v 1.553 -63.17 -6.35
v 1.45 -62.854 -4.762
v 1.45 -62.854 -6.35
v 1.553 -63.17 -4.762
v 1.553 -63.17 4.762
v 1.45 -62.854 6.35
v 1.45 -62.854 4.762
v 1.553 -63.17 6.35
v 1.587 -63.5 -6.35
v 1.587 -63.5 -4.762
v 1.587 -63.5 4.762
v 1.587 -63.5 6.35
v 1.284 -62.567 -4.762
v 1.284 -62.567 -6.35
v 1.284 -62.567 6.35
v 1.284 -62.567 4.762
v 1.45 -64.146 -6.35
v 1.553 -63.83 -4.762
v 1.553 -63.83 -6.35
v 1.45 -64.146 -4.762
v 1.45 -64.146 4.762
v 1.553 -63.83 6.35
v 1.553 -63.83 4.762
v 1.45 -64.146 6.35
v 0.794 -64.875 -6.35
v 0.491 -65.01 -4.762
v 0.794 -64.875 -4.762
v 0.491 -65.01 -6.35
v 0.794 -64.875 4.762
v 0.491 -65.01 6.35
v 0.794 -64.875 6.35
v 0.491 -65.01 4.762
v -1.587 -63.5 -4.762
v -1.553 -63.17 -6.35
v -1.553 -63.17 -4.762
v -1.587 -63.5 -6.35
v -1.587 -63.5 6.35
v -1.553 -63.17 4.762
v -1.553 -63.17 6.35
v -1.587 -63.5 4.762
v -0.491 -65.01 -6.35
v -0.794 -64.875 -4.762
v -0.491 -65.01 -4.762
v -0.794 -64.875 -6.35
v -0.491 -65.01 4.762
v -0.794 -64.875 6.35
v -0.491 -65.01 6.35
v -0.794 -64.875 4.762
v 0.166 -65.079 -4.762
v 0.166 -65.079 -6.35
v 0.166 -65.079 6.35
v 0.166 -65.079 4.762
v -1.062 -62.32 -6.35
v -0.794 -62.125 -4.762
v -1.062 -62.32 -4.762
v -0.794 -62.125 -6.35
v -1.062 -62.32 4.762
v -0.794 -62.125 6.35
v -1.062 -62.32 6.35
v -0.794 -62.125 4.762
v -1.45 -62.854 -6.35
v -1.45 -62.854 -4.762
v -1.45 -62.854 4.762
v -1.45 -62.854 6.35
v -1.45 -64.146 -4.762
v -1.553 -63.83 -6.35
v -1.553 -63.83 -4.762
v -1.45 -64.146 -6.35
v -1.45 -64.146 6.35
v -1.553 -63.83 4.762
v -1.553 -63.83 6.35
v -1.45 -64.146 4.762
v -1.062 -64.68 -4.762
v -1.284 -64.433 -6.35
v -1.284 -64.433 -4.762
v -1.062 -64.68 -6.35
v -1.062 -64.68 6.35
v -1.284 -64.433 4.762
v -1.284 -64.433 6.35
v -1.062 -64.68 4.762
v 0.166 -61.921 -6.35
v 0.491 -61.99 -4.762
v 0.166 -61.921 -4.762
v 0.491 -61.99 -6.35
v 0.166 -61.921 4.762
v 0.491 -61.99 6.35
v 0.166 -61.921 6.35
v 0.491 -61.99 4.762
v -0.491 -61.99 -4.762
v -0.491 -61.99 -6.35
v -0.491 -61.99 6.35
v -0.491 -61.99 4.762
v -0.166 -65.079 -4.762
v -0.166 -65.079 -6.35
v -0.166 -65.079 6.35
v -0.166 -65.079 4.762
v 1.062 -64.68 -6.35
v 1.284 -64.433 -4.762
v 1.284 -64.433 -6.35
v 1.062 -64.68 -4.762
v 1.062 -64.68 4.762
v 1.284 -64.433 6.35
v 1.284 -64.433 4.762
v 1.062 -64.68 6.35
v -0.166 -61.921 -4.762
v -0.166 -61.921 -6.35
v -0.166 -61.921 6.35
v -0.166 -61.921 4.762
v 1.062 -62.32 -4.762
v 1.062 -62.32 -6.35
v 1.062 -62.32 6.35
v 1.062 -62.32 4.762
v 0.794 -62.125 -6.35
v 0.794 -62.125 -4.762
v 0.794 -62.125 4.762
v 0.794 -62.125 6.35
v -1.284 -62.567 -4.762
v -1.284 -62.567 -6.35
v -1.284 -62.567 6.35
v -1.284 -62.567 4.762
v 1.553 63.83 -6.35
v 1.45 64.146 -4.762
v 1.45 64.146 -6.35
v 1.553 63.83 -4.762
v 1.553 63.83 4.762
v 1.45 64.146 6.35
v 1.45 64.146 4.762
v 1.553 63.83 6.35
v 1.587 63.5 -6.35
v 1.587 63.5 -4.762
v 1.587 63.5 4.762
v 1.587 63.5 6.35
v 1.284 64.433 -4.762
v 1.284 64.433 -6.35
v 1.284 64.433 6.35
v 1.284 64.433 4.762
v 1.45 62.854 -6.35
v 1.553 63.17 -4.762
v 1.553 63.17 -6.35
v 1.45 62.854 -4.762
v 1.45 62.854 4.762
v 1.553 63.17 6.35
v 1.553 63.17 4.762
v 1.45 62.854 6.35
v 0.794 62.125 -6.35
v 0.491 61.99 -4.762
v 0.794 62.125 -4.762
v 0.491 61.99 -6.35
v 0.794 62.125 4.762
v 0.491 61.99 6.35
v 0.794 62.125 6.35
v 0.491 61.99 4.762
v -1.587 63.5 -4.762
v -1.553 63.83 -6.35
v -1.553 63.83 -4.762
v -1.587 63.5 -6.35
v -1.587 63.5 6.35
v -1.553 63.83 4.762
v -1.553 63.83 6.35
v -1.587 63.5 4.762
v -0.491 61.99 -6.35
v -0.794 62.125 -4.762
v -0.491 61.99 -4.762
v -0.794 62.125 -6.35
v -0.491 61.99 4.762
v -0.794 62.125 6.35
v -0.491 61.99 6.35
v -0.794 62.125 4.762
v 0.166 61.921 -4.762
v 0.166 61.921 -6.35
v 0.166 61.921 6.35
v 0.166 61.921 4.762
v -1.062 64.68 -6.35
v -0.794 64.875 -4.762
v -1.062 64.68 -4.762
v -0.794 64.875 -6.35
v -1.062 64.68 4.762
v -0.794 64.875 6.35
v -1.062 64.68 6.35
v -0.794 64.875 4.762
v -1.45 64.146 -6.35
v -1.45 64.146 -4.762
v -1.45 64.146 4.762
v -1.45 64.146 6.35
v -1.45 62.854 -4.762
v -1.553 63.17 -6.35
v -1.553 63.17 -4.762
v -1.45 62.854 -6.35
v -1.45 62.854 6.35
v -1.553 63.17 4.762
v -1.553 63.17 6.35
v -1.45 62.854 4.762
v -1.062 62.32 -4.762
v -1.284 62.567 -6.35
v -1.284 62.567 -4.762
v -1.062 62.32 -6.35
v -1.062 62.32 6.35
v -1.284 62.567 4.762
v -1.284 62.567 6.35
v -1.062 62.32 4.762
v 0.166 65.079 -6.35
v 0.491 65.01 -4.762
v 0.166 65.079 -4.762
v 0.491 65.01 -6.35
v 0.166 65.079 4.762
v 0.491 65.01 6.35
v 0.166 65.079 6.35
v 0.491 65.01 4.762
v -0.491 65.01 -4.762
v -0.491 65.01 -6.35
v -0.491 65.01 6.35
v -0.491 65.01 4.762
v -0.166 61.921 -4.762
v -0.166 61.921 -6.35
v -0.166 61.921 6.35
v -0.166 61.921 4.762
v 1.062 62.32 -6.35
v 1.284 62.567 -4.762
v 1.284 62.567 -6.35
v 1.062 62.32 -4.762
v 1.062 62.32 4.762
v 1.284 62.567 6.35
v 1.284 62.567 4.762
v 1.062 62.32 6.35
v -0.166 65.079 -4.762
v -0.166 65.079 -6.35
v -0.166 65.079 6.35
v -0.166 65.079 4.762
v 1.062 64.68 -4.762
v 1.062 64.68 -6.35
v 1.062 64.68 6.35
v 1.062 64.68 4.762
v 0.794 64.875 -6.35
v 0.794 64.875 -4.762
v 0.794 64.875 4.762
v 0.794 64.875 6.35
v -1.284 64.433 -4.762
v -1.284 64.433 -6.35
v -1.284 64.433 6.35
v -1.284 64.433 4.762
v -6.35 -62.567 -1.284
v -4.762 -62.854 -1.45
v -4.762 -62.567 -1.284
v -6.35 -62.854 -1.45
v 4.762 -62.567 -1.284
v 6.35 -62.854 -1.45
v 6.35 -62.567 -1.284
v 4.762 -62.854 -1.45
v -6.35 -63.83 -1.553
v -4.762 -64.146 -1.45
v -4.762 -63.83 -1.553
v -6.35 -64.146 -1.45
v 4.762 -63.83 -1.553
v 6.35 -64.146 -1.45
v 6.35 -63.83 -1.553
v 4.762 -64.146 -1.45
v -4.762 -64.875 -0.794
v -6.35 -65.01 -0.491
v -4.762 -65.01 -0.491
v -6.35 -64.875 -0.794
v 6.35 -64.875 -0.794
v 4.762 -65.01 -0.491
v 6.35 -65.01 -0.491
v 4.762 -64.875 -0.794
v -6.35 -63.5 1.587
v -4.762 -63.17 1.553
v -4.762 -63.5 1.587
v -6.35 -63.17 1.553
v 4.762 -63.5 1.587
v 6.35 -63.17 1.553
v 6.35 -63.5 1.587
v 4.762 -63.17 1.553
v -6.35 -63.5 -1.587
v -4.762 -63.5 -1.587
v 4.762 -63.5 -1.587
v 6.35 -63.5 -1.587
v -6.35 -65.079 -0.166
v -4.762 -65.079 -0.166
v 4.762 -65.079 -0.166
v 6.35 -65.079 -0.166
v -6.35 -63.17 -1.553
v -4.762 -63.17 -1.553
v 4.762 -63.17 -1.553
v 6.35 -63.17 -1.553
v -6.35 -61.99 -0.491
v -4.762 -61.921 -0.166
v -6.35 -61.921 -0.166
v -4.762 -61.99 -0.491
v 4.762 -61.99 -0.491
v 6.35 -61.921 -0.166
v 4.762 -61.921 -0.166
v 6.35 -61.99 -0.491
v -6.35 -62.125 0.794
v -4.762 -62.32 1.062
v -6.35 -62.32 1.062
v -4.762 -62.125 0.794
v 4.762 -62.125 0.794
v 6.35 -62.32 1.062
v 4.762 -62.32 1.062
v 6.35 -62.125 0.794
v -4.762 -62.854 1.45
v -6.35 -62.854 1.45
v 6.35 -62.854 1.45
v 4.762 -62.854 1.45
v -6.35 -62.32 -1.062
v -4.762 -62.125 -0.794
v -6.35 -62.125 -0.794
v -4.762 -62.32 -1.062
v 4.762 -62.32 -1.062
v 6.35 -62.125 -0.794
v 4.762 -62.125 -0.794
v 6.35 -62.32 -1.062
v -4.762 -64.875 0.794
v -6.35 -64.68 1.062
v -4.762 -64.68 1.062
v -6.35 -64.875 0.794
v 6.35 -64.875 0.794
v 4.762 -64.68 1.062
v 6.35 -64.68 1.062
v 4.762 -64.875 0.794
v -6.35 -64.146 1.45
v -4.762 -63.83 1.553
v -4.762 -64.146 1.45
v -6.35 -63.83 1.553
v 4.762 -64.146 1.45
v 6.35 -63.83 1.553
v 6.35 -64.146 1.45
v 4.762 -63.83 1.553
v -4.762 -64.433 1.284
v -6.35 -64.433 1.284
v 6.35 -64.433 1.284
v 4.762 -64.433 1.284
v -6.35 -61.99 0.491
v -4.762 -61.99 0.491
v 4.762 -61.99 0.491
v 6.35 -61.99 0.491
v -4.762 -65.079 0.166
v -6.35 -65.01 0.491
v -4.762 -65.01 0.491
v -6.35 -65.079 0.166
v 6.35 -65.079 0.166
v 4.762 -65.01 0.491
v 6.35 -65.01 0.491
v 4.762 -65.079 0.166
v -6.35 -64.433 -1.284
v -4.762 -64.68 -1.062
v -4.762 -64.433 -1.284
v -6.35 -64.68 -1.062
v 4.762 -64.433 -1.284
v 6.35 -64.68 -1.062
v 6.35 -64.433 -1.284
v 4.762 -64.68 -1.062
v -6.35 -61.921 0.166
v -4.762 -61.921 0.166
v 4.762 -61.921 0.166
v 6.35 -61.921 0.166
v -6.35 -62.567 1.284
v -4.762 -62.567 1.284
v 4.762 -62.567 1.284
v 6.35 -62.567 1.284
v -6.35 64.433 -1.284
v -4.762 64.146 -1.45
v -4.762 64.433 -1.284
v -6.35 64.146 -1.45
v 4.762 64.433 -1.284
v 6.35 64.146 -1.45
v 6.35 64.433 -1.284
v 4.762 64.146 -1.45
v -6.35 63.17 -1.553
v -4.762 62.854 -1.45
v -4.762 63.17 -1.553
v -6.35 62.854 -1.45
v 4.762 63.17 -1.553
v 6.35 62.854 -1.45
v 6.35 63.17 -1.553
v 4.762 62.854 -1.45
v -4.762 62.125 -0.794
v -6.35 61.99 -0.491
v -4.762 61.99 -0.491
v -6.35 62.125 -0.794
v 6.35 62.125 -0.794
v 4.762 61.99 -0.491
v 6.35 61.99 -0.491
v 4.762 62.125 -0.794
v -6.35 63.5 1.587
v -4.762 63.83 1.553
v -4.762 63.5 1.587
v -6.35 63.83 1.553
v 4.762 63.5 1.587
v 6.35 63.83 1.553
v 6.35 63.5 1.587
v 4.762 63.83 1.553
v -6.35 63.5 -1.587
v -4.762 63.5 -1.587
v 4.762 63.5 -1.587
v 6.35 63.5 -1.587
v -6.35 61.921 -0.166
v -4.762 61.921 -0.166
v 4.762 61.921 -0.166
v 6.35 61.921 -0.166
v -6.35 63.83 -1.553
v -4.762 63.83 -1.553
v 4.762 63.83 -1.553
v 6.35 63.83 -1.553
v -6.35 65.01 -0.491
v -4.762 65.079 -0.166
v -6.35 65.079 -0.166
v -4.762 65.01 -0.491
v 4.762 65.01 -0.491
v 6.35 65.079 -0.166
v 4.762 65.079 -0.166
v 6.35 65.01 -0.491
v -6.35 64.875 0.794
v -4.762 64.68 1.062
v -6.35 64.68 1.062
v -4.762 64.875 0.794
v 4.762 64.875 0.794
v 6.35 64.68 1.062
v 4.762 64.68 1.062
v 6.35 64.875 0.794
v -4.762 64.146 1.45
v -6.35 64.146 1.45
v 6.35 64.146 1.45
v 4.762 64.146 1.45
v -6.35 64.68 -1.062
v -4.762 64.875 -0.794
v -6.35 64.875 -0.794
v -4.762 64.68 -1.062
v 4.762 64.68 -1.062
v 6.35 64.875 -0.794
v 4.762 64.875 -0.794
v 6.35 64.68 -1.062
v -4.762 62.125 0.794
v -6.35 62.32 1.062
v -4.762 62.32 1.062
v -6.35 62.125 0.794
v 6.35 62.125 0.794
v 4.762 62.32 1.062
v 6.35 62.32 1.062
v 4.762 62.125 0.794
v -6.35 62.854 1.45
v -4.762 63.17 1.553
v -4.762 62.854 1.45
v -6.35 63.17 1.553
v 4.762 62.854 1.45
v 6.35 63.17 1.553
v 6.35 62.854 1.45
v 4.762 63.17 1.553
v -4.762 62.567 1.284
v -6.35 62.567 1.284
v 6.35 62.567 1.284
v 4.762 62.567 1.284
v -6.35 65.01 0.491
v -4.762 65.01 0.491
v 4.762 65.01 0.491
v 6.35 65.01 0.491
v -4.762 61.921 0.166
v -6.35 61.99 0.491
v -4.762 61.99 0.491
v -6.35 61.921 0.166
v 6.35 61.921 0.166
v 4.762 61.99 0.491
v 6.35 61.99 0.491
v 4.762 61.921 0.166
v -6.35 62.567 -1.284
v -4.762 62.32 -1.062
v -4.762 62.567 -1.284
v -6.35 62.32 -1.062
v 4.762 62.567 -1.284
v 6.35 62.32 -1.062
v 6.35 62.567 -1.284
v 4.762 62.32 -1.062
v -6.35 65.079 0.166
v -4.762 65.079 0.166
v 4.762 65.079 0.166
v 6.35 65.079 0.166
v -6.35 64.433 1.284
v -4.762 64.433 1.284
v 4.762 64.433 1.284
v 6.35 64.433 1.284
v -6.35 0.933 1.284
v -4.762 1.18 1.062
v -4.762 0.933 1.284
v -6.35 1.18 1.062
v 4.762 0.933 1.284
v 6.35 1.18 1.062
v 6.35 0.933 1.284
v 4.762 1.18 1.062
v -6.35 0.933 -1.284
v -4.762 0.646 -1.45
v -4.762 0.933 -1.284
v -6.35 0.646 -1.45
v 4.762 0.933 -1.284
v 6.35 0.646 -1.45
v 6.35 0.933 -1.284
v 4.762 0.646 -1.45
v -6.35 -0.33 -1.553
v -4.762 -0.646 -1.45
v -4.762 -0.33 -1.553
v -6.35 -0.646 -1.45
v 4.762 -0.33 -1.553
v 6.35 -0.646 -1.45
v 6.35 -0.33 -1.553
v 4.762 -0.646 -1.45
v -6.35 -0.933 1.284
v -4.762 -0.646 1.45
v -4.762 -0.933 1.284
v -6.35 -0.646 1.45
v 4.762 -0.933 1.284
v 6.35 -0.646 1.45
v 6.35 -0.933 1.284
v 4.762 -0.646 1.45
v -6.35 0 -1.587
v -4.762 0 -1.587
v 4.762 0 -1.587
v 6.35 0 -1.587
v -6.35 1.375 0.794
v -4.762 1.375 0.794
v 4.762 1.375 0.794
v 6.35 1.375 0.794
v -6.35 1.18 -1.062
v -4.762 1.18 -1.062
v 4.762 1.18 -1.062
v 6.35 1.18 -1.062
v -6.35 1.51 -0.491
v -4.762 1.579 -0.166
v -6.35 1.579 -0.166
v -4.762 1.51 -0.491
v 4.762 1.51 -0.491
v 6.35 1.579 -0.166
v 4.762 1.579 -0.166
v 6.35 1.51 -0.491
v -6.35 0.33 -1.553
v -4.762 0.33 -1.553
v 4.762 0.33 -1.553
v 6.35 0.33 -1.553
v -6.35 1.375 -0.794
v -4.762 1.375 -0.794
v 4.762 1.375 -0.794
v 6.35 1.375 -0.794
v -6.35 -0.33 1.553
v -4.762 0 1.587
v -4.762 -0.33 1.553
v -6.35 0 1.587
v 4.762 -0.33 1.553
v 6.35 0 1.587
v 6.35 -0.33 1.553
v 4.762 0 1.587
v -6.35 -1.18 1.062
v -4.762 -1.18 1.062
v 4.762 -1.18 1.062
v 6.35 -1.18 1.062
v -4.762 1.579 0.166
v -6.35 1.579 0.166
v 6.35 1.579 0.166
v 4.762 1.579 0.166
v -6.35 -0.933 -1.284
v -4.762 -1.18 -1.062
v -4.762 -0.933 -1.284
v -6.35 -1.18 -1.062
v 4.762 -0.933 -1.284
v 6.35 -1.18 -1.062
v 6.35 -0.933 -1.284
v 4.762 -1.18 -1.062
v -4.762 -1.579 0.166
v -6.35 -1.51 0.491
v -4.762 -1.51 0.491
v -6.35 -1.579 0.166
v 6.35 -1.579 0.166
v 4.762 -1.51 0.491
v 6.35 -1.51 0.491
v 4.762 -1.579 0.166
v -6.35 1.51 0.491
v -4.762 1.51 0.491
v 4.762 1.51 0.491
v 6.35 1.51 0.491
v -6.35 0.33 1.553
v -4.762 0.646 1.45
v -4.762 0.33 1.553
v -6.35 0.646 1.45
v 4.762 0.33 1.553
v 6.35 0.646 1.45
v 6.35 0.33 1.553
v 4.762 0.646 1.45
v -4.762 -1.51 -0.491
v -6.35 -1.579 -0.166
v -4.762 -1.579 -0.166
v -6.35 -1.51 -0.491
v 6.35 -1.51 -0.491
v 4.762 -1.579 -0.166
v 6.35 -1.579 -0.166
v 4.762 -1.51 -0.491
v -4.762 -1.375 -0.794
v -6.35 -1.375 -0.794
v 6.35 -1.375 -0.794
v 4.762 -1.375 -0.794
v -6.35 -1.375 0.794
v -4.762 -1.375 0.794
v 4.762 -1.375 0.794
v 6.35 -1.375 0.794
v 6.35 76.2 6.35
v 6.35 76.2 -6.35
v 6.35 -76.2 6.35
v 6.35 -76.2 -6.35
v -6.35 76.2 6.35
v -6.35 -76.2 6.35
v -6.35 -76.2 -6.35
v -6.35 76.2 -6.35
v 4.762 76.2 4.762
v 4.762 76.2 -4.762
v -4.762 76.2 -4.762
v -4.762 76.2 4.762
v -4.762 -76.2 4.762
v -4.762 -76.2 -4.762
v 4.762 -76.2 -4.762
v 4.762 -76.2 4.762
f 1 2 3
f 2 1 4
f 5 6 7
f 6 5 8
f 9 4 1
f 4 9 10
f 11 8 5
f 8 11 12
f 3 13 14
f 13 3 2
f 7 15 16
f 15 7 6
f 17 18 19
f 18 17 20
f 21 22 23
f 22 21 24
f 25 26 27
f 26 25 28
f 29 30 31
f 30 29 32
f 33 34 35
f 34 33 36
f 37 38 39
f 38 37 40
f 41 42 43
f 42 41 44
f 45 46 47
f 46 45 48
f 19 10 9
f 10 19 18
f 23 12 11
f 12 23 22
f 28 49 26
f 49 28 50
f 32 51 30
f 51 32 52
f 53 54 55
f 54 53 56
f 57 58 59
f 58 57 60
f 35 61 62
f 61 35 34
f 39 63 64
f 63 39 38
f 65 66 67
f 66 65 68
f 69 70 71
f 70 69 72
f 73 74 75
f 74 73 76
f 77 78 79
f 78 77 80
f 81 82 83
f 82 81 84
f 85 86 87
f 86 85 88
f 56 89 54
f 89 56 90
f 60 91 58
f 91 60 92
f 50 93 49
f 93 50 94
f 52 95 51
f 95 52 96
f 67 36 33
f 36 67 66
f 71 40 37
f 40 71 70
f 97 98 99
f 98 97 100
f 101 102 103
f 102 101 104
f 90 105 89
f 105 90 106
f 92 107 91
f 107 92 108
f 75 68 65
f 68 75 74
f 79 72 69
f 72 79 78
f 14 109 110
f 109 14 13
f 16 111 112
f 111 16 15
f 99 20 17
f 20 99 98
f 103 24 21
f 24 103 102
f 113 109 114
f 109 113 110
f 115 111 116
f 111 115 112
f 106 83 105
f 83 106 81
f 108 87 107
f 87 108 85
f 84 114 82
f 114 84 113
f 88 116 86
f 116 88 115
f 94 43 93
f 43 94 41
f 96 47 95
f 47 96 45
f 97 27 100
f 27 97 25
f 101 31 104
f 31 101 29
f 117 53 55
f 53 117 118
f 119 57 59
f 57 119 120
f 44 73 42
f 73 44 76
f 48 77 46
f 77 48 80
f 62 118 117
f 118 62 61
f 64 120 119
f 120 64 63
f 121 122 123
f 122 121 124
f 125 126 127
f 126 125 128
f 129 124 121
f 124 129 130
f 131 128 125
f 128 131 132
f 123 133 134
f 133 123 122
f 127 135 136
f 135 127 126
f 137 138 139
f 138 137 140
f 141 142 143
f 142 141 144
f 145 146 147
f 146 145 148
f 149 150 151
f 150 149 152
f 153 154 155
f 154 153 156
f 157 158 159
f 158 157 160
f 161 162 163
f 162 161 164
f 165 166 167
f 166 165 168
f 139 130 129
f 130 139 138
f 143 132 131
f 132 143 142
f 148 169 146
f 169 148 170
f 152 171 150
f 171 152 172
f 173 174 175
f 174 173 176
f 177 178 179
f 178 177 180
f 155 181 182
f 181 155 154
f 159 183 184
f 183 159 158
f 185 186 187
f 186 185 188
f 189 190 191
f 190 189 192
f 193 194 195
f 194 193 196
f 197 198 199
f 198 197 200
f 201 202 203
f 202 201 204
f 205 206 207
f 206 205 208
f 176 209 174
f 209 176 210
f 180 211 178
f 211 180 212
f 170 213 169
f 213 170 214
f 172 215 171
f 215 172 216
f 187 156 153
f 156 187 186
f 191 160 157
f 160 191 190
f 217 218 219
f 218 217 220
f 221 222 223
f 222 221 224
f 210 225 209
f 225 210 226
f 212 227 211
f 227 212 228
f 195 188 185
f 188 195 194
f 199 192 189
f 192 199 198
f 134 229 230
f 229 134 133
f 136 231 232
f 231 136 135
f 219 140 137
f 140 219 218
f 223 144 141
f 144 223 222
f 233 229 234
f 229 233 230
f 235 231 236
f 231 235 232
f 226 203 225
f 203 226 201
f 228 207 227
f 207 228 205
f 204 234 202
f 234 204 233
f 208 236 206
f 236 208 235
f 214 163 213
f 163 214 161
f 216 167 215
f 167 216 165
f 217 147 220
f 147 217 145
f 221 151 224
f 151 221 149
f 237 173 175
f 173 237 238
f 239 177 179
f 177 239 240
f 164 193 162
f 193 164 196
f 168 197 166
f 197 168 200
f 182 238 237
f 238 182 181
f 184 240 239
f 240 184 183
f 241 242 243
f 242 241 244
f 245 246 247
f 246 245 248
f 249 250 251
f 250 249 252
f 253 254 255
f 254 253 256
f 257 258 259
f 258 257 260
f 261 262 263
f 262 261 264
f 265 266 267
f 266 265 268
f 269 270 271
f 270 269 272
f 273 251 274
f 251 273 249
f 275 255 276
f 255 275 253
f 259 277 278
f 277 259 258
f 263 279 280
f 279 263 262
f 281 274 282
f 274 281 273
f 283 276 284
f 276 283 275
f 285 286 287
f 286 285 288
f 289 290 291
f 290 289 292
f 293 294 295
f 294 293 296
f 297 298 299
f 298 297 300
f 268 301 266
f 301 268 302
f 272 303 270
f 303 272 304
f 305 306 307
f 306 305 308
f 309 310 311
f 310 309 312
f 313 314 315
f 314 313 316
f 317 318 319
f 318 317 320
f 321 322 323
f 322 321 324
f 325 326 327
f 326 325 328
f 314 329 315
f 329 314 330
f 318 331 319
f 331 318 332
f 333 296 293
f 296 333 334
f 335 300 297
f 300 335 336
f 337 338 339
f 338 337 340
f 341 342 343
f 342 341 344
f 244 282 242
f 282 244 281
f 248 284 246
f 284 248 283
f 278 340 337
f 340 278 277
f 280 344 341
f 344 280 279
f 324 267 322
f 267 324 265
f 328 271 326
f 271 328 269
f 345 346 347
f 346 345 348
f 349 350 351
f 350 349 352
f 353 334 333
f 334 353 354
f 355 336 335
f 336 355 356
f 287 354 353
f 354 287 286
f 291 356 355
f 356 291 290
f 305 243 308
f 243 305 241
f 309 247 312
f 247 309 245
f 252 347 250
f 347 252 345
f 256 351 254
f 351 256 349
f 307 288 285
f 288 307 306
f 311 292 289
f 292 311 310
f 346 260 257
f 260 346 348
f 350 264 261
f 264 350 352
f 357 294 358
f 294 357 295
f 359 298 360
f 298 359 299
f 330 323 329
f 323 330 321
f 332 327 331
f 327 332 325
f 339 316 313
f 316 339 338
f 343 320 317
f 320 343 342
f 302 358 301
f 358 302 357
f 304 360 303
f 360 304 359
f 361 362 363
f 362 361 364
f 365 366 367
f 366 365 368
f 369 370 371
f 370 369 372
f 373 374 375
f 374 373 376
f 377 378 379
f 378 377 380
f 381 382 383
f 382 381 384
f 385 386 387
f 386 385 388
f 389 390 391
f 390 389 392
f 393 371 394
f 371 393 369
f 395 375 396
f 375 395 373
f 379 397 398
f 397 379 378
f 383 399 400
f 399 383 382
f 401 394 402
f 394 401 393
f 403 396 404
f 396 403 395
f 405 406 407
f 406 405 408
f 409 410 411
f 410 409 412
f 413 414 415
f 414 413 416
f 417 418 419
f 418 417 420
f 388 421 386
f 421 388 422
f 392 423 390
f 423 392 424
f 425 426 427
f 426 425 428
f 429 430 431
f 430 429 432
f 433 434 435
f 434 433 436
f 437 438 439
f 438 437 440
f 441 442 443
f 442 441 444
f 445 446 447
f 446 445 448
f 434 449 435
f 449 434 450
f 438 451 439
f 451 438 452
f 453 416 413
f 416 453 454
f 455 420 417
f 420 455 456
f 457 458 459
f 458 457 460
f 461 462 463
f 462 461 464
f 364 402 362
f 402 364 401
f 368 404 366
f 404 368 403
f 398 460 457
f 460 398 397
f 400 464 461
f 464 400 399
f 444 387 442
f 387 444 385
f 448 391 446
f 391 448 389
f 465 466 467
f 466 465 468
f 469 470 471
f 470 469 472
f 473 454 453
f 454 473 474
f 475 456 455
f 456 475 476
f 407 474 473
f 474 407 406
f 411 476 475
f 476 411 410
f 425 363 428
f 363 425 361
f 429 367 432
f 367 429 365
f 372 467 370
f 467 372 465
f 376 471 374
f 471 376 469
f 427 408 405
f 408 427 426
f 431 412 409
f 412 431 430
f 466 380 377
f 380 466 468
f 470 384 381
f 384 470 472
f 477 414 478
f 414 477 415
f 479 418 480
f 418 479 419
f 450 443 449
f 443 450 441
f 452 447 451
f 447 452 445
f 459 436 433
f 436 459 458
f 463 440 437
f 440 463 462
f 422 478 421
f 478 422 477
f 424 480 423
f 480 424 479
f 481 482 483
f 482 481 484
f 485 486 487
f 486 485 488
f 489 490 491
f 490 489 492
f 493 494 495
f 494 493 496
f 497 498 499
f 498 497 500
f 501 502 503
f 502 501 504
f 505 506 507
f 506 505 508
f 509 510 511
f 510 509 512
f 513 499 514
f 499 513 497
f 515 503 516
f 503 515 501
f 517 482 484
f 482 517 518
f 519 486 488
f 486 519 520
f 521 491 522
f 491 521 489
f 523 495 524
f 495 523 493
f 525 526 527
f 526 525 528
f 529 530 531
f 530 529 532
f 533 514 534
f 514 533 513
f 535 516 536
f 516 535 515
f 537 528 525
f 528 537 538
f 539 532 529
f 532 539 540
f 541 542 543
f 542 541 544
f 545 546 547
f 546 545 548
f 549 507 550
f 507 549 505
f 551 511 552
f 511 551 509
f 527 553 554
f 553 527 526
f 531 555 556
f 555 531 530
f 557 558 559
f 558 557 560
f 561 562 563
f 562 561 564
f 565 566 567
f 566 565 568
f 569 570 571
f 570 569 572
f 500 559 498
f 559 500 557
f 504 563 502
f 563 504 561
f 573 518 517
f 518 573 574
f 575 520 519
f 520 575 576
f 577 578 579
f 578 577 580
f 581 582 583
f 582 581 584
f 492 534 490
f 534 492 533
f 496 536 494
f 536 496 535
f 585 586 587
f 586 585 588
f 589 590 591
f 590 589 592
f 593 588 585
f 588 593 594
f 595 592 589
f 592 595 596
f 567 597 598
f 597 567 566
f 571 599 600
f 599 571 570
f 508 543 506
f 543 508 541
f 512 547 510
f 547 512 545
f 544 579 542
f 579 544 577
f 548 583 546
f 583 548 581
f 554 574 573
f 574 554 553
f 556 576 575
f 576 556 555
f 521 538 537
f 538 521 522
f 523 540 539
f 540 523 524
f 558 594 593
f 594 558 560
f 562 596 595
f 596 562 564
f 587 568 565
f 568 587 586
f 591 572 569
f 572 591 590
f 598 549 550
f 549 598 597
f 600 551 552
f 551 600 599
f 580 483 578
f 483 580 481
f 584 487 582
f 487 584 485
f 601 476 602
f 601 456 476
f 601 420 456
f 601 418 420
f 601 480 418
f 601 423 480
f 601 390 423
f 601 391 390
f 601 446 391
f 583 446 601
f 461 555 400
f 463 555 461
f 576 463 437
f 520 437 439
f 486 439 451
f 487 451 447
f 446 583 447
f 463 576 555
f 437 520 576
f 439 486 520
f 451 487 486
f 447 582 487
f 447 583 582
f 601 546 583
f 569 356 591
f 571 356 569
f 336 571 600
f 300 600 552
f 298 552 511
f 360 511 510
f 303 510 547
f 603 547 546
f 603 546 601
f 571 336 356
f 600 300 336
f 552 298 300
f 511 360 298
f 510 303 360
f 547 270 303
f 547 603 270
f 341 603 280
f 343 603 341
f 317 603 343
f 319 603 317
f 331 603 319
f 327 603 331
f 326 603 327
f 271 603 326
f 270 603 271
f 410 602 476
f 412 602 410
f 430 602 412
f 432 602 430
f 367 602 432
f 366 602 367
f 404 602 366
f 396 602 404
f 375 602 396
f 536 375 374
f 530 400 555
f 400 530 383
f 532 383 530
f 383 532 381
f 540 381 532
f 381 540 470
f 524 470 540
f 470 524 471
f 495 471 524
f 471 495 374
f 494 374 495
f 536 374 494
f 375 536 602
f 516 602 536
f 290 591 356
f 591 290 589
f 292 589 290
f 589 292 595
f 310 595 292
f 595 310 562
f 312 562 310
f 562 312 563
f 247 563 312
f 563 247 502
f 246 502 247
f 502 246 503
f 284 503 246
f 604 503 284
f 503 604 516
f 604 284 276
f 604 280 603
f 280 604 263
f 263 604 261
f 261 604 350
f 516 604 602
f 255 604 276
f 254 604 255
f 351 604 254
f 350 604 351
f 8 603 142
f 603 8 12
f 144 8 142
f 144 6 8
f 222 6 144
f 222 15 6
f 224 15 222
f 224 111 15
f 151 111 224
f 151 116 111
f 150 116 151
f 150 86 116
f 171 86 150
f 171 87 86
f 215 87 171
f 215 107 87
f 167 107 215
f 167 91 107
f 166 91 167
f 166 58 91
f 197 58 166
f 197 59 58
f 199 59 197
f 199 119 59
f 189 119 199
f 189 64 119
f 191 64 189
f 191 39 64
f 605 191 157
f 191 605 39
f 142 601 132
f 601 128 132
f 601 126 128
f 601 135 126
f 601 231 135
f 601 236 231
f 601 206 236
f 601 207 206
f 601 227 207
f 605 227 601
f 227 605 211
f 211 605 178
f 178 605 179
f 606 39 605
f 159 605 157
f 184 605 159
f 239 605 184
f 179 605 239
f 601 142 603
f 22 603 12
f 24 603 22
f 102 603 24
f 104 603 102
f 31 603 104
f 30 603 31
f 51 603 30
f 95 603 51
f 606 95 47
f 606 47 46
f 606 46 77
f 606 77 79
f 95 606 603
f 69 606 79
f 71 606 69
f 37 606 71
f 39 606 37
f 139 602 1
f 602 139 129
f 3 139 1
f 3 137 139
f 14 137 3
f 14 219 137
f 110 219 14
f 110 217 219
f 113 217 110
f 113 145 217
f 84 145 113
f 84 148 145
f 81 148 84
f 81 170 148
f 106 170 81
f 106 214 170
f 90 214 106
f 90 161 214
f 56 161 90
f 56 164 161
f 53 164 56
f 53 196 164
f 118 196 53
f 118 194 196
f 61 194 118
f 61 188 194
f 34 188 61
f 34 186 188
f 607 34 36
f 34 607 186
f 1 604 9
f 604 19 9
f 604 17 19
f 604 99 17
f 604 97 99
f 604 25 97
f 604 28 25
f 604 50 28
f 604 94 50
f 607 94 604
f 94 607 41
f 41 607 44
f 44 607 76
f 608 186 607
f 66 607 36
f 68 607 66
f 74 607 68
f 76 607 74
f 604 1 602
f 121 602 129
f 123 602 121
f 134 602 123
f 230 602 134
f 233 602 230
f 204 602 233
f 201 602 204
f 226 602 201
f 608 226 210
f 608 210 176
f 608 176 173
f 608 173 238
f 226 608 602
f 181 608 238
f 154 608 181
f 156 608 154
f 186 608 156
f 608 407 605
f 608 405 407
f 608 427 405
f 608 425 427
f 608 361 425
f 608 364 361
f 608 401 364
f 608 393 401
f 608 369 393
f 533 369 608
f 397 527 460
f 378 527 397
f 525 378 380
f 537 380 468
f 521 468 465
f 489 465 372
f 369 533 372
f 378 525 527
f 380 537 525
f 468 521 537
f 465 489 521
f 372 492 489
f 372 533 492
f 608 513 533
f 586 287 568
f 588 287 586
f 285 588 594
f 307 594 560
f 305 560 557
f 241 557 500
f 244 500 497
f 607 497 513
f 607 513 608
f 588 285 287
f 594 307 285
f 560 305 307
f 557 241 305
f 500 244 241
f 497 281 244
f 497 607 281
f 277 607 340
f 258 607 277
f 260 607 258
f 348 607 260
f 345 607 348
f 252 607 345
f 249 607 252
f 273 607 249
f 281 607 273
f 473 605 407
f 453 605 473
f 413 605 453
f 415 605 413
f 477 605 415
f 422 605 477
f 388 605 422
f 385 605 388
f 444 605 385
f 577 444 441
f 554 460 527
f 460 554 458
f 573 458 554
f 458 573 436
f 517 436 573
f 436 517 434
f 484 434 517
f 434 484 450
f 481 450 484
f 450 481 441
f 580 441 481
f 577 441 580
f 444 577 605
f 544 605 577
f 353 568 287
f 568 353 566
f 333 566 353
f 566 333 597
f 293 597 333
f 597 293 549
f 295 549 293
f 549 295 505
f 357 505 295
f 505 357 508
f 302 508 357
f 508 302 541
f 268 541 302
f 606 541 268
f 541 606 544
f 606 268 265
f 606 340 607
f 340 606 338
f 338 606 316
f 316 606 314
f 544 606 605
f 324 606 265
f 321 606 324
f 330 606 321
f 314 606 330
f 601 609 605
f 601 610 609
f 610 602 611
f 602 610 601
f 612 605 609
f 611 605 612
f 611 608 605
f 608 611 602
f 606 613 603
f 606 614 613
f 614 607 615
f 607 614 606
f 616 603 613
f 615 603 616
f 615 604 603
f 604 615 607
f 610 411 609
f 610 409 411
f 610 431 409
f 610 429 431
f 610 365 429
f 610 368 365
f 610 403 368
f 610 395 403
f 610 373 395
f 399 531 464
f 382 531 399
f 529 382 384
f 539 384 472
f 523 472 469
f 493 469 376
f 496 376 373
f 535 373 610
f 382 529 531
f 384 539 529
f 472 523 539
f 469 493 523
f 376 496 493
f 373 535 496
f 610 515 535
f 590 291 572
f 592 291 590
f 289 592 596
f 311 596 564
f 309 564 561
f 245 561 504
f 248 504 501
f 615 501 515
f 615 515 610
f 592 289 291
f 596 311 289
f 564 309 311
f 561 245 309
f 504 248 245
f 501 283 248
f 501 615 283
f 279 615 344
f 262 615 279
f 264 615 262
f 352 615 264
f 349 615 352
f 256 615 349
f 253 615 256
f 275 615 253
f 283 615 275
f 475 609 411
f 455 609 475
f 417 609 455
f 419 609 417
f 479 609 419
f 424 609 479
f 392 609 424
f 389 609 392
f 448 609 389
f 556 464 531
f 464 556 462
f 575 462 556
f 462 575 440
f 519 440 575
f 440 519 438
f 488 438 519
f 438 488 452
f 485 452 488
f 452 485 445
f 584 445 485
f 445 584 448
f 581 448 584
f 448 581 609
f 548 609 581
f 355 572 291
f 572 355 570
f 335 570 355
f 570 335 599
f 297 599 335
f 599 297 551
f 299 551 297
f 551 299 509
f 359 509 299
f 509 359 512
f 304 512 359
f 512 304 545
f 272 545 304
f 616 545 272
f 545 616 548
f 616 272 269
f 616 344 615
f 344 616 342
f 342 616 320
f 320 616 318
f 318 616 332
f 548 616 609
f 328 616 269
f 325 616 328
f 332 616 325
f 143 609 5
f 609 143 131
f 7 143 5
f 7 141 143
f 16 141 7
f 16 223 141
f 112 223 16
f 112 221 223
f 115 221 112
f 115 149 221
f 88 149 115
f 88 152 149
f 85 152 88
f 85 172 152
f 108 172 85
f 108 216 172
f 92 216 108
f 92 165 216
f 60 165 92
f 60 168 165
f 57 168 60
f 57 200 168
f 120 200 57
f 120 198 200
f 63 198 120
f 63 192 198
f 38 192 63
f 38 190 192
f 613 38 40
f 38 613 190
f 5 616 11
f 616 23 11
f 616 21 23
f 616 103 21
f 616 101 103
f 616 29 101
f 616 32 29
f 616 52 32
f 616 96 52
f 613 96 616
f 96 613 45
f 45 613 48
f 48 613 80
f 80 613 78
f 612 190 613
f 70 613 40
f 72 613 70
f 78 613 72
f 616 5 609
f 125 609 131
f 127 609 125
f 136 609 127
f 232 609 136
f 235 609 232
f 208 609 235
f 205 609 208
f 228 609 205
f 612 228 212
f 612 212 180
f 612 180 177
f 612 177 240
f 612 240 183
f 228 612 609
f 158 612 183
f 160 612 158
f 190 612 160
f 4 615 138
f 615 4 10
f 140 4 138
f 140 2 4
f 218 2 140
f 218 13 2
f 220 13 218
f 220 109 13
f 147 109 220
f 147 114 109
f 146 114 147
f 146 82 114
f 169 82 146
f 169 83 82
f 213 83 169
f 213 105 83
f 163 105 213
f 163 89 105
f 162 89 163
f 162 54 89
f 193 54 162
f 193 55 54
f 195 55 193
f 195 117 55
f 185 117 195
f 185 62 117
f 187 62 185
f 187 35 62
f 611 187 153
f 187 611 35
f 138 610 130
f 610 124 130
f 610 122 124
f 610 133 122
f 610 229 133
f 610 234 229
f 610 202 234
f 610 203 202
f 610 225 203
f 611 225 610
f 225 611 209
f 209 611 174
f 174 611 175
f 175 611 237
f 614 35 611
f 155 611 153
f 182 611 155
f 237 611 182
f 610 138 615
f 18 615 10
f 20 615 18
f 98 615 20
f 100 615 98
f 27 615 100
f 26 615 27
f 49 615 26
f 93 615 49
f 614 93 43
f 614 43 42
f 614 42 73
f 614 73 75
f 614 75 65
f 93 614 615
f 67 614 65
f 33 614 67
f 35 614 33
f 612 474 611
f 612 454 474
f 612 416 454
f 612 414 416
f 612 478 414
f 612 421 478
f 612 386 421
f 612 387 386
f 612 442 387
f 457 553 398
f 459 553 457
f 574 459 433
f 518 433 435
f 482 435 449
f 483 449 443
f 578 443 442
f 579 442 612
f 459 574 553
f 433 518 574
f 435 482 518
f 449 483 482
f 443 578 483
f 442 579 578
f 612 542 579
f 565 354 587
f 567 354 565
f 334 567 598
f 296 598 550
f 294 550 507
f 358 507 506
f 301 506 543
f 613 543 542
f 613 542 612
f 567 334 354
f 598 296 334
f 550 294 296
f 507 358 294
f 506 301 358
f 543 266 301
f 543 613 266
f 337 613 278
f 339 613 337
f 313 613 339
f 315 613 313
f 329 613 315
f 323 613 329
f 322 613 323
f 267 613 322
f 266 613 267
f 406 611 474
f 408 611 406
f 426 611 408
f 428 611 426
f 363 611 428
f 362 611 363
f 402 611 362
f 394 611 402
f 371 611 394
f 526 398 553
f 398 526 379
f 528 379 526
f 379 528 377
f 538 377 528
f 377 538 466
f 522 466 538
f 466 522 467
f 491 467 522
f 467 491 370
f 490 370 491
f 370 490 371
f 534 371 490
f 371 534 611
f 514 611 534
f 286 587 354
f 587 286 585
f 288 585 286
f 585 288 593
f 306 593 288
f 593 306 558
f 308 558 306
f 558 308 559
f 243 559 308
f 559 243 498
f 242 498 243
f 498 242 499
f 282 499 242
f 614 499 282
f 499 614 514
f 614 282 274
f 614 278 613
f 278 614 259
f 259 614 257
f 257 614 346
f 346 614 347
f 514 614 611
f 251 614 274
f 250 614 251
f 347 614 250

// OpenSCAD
// file: common.scad
// Units are mm.

function i2mm(x) = x * 0.0254 * 1000;

function rotor_radius() = i2mm(6);
function bolt_diam() = i2mm(1.0/8);
function arm_count() = 8;

function center_to_motor() = 1.03125 * rotor_radius(); // overall center to motor axis.

function web_dx() = center_to_motor() / sqrt(2); // lateral distance from center to webbing bolt hole.

// hub gusset
function edge_radius() = i2mm(1);
function bolt_radial_position() = i2mm(0.75);

// tube
function tube_height() = i2mm(0.5);
function tube_width() = i2mm(0.5);
function tube_thickness() = i2mm(1/16);
// main file
// Units are mm.

use <common.scad>;


module tube(length, top_bolts = [], side_bolts = []) {
    difference() {
        cube([tube_width(), length, tube_height()], center = true);
        cube([tube_width() - 2 * tube_thickness(), 2 * length, tube_height() - 2 * tube_thickness()], center = true);
        for (i = top_bolts) {
            translate([0, -length / 2 + i, 0])
                cylinder(h = 2 * tube_height(), d = bolt_diam(), center = true, $fn = 30);
        }
        for (i = side_bolts) {
            translate([0, -length / 2 + i, 0])
                rotate([0, 90, 0])
                    cylinder(h = 2 * tube_width(), d = bolt_diam(), center = true, $fn = 30);
        }
    }
}

test_length = i2mm(6);
tube(test_length, [tube_width(), test_length - tube_width()], [tube_width(), test_length - tube_width(), test_length / 2]);
